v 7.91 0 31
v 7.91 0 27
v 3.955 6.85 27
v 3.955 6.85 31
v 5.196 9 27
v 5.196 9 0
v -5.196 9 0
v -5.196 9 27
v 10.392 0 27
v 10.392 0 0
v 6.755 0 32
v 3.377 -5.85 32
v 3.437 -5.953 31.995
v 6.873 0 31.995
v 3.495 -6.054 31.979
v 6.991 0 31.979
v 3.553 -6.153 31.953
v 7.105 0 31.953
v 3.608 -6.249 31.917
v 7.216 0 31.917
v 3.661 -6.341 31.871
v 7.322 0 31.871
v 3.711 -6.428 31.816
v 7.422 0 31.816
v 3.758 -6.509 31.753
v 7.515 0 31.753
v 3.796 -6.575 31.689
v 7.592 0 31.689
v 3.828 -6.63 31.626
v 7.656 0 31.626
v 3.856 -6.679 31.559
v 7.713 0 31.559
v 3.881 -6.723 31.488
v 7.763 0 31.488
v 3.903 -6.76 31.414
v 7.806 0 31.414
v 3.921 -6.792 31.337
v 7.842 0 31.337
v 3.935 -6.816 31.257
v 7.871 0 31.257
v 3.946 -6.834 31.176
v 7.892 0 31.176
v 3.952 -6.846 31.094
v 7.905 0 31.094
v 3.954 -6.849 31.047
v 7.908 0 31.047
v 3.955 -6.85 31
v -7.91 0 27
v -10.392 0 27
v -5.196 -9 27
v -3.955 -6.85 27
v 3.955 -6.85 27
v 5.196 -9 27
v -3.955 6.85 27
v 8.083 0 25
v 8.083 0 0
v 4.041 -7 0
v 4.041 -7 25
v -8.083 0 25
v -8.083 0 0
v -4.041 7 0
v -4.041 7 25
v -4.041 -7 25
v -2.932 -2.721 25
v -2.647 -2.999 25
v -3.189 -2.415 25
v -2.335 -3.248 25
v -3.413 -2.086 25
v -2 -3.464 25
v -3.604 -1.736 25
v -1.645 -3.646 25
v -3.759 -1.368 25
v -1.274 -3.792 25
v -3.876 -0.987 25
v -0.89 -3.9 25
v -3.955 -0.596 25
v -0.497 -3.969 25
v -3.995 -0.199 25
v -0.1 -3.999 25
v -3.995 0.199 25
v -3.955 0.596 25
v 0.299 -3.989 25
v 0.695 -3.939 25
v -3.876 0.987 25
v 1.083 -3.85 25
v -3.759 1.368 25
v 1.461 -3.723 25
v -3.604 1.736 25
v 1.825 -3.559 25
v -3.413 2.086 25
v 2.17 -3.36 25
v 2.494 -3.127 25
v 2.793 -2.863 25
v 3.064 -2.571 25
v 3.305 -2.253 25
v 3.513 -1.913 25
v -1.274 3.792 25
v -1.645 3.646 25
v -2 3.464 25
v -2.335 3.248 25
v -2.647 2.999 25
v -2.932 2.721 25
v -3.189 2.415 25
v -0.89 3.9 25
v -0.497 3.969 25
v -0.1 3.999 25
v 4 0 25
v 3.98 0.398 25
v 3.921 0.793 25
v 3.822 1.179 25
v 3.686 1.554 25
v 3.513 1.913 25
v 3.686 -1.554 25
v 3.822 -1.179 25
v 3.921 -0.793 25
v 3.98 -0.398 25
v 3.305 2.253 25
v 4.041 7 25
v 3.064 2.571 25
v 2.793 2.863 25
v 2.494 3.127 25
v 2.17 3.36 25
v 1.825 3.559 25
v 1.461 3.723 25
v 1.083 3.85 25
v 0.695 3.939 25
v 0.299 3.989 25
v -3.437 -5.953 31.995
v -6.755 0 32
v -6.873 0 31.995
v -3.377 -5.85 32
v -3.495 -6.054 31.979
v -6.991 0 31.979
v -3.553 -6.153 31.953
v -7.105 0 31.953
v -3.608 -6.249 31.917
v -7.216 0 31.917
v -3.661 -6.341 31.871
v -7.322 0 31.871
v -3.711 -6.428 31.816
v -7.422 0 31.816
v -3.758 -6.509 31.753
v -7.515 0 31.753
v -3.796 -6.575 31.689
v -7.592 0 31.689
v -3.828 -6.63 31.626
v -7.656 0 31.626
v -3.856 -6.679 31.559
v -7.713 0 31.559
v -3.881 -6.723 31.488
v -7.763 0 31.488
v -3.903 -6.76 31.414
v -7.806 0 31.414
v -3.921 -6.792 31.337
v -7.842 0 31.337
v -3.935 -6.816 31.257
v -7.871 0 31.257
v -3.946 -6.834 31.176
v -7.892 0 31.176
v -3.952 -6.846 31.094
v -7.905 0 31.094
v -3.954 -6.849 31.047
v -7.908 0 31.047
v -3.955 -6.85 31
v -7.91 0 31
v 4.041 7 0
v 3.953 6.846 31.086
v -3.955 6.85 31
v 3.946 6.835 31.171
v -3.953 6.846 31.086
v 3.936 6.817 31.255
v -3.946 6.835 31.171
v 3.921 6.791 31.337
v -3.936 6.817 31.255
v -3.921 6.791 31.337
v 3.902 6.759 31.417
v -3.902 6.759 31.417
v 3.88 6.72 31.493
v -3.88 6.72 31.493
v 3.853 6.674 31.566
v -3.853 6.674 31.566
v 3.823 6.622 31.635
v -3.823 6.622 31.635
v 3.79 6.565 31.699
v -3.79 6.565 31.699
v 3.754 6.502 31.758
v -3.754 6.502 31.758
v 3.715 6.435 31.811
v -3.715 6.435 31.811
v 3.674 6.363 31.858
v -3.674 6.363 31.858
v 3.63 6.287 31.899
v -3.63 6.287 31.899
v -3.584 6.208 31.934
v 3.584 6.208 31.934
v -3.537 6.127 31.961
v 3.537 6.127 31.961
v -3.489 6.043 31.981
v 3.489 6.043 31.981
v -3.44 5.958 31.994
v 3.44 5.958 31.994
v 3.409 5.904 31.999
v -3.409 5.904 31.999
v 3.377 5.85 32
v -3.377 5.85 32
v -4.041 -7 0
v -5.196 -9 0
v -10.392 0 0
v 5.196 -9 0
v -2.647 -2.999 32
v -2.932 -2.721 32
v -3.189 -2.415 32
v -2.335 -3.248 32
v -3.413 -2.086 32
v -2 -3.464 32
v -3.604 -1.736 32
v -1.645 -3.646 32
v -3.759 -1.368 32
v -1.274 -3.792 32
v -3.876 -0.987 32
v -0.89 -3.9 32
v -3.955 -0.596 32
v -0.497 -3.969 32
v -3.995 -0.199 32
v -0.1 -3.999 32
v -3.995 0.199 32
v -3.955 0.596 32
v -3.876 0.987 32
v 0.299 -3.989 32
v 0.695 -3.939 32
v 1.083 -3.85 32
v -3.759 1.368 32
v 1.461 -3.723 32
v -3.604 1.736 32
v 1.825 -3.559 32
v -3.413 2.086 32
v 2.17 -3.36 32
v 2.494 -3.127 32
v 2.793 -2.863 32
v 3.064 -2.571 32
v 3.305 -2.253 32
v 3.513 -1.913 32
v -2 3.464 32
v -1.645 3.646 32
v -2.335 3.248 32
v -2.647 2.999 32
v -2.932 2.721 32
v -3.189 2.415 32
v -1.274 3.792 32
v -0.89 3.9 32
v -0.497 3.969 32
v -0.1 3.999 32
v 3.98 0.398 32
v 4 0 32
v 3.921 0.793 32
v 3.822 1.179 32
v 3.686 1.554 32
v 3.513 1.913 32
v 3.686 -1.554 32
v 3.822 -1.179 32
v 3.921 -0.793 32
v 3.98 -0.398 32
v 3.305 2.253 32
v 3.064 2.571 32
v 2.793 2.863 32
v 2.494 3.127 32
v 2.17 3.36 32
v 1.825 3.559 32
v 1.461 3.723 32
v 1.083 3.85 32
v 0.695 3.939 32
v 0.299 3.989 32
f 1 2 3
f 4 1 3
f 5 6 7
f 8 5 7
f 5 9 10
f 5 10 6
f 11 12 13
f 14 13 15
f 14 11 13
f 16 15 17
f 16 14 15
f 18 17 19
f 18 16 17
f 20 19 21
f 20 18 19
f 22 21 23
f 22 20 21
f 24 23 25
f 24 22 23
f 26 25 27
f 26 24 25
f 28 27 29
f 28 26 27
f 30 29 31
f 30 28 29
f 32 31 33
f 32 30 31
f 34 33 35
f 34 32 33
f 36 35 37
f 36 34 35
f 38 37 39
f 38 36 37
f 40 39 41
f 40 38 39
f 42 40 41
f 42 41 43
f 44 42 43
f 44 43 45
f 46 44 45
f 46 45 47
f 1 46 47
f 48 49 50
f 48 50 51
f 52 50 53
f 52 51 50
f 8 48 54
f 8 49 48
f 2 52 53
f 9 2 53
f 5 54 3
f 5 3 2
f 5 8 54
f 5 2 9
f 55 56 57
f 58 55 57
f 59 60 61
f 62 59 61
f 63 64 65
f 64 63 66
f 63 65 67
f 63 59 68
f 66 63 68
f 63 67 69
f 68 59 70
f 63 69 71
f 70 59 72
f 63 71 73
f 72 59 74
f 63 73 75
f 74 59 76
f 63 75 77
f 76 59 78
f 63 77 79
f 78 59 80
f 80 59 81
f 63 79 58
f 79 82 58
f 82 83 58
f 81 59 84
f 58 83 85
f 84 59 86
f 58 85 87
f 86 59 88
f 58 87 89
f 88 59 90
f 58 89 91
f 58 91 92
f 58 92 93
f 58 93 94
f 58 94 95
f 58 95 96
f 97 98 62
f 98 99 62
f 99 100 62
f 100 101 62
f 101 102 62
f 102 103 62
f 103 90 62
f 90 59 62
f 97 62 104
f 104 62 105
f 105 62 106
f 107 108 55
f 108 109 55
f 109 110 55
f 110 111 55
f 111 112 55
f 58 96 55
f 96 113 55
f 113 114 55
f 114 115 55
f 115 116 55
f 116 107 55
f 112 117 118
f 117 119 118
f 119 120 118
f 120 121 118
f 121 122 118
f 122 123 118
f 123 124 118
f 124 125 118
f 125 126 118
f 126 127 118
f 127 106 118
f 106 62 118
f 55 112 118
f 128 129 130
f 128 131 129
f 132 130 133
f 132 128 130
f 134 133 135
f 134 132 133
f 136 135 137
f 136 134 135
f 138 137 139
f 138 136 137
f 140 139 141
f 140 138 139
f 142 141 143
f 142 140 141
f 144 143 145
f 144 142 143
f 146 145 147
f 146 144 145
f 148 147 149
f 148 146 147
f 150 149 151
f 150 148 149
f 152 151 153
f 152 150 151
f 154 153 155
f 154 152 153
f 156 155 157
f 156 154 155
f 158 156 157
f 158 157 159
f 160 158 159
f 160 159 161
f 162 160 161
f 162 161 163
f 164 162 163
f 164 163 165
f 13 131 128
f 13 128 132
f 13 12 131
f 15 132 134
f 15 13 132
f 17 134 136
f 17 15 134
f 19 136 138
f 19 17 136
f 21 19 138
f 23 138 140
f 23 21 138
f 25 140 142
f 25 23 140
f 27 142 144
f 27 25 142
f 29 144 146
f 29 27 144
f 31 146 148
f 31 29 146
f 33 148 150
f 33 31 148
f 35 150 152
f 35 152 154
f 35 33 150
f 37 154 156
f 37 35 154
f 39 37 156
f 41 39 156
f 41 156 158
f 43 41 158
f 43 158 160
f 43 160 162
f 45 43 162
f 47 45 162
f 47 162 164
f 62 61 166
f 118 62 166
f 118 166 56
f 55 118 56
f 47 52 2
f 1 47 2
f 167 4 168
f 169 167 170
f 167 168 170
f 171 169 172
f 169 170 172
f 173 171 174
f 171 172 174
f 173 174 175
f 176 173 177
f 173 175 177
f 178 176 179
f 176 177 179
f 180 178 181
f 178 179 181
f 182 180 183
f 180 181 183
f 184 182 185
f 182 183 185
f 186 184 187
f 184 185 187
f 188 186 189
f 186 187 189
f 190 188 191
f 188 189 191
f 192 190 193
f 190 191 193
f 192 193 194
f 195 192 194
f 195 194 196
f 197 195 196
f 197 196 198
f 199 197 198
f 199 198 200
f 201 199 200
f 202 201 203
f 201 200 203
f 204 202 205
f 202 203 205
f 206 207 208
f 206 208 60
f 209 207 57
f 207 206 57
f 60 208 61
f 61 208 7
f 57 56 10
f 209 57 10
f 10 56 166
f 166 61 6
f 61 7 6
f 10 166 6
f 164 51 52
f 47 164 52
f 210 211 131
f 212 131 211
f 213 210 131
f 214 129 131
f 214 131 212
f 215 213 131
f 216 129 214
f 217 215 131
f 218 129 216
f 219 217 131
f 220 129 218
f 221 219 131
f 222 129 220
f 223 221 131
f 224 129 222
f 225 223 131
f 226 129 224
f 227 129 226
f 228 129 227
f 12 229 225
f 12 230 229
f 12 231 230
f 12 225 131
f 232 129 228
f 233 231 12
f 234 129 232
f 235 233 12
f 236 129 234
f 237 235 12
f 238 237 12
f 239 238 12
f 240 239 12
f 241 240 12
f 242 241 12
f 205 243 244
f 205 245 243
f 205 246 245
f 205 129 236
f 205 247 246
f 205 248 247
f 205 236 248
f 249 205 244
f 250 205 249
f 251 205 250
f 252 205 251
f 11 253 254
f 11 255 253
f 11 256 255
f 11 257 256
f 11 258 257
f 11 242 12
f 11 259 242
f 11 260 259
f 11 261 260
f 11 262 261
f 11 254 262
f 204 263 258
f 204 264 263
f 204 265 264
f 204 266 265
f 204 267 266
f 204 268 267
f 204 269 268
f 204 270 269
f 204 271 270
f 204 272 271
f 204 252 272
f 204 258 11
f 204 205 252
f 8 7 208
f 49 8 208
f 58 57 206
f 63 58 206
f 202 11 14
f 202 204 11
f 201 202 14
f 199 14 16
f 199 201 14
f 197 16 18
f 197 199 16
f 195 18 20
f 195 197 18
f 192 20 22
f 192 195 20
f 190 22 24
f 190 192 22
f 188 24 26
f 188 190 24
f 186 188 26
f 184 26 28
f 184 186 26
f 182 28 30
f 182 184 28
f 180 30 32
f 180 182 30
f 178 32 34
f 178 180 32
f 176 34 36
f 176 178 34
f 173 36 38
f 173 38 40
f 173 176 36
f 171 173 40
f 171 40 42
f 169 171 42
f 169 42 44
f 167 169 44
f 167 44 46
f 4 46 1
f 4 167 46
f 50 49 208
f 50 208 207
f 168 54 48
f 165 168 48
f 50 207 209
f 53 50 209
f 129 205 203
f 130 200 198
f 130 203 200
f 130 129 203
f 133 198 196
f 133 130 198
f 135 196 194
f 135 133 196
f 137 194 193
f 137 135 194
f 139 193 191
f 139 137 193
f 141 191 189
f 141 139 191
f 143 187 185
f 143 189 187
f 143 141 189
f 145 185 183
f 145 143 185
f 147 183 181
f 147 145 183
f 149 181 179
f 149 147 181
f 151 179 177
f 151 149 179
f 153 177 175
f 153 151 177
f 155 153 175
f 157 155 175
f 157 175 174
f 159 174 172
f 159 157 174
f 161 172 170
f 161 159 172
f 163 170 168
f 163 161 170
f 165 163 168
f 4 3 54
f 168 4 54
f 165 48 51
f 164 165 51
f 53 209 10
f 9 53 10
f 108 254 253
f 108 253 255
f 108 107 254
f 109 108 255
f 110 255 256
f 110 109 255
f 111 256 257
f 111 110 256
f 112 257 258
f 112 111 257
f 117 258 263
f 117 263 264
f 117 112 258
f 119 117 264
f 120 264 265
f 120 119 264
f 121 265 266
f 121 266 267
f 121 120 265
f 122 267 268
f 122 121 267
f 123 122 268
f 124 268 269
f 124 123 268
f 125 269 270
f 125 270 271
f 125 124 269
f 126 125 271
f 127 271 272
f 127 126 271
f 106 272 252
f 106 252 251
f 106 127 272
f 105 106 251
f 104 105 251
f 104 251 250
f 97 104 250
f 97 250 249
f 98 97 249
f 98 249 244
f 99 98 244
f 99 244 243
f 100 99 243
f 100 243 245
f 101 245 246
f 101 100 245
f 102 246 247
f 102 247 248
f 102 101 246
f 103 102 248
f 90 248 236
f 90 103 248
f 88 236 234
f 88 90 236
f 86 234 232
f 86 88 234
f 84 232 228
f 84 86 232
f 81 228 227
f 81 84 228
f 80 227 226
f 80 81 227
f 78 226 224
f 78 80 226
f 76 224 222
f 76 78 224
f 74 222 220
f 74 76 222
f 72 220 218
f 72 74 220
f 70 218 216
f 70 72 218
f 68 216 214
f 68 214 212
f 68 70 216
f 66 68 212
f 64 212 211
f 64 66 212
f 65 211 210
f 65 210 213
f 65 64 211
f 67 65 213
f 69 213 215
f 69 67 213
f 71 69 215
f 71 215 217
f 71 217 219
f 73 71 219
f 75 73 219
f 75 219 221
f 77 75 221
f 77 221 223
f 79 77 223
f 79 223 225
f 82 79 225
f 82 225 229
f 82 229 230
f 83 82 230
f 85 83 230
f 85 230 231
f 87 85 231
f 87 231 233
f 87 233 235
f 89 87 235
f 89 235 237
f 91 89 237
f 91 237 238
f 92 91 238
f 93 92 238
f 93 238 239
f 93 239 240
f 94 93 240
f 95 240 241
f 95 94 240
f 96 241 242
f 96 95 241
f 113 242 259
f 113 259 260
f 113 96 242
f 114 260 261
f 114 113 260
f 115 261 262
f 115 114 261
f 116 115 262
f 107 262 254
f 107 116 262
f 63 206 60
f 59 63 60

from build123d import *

# Parameters (mm, degrees)
F1_DEPTH = 27
F2_R     = 4
F3_DEPTH = 2
F4_R     = 4
F5_DEPTH = 5
F6_R     = 1


with BuildPart() as f1:
    # F0 (on Top) → F1 (new body)
    with BuildSketch(Plane.XY):
        Polygon((5.196152, 9), (-5.196152, 9), (-10.392305, 0), (-5.196152, -9), (5.196152, -9), (10.392305, 0), align=None)
        Polygon((-8.082904, 0), (-4.041452, 7), (4.041452, 7), (8.082904, 0), (4.041452, -7), (-4.041452, -7), align=None, mode=Mode.SUBTRACT)
    extrude(amount=F1_DEPTH)

    # F2 (on face) → F3 (join)
    with BuildSketch(Plane.XY.offset(27)):
        Polygon((5.196152, 9), (-5.196152, 9), (-10.392305, 0), (-5.196152, -9), (5.196152, -9), (10.392305, 0), align=None)
        Circle(F2_R, mode=Mode.SUBTRACT)
    extrude(amount=-F3_DEPTH)

    # F4 (on face) → F5 (join)
    with BuildSketch(Plane.XY.offset(27)):
        Polygon((3.954849, 6.85), (-3.954849, 6.85), (-7.909699, 0), (-3.954849, -6.85), (3.954849, -6.85), (7.909699, 0), align=None)
        Circle(F4_R, mode=Mode.SUBTRACT)
    extrude(amount=F5_DEPTH)

    # F6
    f6_edges = [f1.edges().sort_by_distance(p)[0] for p in [
        (0, 6.85, 32),
        (-5.932274, 3.425, 32),
        (-5.932274, -3.425, 32),
        (0, -6.85, 32),
        (5.932274, -3.425, 32),
        (5.932274, 3.425, 32),
    ]]
    fillet(f6_edges, radius=F6_R)


solid = f1.part
